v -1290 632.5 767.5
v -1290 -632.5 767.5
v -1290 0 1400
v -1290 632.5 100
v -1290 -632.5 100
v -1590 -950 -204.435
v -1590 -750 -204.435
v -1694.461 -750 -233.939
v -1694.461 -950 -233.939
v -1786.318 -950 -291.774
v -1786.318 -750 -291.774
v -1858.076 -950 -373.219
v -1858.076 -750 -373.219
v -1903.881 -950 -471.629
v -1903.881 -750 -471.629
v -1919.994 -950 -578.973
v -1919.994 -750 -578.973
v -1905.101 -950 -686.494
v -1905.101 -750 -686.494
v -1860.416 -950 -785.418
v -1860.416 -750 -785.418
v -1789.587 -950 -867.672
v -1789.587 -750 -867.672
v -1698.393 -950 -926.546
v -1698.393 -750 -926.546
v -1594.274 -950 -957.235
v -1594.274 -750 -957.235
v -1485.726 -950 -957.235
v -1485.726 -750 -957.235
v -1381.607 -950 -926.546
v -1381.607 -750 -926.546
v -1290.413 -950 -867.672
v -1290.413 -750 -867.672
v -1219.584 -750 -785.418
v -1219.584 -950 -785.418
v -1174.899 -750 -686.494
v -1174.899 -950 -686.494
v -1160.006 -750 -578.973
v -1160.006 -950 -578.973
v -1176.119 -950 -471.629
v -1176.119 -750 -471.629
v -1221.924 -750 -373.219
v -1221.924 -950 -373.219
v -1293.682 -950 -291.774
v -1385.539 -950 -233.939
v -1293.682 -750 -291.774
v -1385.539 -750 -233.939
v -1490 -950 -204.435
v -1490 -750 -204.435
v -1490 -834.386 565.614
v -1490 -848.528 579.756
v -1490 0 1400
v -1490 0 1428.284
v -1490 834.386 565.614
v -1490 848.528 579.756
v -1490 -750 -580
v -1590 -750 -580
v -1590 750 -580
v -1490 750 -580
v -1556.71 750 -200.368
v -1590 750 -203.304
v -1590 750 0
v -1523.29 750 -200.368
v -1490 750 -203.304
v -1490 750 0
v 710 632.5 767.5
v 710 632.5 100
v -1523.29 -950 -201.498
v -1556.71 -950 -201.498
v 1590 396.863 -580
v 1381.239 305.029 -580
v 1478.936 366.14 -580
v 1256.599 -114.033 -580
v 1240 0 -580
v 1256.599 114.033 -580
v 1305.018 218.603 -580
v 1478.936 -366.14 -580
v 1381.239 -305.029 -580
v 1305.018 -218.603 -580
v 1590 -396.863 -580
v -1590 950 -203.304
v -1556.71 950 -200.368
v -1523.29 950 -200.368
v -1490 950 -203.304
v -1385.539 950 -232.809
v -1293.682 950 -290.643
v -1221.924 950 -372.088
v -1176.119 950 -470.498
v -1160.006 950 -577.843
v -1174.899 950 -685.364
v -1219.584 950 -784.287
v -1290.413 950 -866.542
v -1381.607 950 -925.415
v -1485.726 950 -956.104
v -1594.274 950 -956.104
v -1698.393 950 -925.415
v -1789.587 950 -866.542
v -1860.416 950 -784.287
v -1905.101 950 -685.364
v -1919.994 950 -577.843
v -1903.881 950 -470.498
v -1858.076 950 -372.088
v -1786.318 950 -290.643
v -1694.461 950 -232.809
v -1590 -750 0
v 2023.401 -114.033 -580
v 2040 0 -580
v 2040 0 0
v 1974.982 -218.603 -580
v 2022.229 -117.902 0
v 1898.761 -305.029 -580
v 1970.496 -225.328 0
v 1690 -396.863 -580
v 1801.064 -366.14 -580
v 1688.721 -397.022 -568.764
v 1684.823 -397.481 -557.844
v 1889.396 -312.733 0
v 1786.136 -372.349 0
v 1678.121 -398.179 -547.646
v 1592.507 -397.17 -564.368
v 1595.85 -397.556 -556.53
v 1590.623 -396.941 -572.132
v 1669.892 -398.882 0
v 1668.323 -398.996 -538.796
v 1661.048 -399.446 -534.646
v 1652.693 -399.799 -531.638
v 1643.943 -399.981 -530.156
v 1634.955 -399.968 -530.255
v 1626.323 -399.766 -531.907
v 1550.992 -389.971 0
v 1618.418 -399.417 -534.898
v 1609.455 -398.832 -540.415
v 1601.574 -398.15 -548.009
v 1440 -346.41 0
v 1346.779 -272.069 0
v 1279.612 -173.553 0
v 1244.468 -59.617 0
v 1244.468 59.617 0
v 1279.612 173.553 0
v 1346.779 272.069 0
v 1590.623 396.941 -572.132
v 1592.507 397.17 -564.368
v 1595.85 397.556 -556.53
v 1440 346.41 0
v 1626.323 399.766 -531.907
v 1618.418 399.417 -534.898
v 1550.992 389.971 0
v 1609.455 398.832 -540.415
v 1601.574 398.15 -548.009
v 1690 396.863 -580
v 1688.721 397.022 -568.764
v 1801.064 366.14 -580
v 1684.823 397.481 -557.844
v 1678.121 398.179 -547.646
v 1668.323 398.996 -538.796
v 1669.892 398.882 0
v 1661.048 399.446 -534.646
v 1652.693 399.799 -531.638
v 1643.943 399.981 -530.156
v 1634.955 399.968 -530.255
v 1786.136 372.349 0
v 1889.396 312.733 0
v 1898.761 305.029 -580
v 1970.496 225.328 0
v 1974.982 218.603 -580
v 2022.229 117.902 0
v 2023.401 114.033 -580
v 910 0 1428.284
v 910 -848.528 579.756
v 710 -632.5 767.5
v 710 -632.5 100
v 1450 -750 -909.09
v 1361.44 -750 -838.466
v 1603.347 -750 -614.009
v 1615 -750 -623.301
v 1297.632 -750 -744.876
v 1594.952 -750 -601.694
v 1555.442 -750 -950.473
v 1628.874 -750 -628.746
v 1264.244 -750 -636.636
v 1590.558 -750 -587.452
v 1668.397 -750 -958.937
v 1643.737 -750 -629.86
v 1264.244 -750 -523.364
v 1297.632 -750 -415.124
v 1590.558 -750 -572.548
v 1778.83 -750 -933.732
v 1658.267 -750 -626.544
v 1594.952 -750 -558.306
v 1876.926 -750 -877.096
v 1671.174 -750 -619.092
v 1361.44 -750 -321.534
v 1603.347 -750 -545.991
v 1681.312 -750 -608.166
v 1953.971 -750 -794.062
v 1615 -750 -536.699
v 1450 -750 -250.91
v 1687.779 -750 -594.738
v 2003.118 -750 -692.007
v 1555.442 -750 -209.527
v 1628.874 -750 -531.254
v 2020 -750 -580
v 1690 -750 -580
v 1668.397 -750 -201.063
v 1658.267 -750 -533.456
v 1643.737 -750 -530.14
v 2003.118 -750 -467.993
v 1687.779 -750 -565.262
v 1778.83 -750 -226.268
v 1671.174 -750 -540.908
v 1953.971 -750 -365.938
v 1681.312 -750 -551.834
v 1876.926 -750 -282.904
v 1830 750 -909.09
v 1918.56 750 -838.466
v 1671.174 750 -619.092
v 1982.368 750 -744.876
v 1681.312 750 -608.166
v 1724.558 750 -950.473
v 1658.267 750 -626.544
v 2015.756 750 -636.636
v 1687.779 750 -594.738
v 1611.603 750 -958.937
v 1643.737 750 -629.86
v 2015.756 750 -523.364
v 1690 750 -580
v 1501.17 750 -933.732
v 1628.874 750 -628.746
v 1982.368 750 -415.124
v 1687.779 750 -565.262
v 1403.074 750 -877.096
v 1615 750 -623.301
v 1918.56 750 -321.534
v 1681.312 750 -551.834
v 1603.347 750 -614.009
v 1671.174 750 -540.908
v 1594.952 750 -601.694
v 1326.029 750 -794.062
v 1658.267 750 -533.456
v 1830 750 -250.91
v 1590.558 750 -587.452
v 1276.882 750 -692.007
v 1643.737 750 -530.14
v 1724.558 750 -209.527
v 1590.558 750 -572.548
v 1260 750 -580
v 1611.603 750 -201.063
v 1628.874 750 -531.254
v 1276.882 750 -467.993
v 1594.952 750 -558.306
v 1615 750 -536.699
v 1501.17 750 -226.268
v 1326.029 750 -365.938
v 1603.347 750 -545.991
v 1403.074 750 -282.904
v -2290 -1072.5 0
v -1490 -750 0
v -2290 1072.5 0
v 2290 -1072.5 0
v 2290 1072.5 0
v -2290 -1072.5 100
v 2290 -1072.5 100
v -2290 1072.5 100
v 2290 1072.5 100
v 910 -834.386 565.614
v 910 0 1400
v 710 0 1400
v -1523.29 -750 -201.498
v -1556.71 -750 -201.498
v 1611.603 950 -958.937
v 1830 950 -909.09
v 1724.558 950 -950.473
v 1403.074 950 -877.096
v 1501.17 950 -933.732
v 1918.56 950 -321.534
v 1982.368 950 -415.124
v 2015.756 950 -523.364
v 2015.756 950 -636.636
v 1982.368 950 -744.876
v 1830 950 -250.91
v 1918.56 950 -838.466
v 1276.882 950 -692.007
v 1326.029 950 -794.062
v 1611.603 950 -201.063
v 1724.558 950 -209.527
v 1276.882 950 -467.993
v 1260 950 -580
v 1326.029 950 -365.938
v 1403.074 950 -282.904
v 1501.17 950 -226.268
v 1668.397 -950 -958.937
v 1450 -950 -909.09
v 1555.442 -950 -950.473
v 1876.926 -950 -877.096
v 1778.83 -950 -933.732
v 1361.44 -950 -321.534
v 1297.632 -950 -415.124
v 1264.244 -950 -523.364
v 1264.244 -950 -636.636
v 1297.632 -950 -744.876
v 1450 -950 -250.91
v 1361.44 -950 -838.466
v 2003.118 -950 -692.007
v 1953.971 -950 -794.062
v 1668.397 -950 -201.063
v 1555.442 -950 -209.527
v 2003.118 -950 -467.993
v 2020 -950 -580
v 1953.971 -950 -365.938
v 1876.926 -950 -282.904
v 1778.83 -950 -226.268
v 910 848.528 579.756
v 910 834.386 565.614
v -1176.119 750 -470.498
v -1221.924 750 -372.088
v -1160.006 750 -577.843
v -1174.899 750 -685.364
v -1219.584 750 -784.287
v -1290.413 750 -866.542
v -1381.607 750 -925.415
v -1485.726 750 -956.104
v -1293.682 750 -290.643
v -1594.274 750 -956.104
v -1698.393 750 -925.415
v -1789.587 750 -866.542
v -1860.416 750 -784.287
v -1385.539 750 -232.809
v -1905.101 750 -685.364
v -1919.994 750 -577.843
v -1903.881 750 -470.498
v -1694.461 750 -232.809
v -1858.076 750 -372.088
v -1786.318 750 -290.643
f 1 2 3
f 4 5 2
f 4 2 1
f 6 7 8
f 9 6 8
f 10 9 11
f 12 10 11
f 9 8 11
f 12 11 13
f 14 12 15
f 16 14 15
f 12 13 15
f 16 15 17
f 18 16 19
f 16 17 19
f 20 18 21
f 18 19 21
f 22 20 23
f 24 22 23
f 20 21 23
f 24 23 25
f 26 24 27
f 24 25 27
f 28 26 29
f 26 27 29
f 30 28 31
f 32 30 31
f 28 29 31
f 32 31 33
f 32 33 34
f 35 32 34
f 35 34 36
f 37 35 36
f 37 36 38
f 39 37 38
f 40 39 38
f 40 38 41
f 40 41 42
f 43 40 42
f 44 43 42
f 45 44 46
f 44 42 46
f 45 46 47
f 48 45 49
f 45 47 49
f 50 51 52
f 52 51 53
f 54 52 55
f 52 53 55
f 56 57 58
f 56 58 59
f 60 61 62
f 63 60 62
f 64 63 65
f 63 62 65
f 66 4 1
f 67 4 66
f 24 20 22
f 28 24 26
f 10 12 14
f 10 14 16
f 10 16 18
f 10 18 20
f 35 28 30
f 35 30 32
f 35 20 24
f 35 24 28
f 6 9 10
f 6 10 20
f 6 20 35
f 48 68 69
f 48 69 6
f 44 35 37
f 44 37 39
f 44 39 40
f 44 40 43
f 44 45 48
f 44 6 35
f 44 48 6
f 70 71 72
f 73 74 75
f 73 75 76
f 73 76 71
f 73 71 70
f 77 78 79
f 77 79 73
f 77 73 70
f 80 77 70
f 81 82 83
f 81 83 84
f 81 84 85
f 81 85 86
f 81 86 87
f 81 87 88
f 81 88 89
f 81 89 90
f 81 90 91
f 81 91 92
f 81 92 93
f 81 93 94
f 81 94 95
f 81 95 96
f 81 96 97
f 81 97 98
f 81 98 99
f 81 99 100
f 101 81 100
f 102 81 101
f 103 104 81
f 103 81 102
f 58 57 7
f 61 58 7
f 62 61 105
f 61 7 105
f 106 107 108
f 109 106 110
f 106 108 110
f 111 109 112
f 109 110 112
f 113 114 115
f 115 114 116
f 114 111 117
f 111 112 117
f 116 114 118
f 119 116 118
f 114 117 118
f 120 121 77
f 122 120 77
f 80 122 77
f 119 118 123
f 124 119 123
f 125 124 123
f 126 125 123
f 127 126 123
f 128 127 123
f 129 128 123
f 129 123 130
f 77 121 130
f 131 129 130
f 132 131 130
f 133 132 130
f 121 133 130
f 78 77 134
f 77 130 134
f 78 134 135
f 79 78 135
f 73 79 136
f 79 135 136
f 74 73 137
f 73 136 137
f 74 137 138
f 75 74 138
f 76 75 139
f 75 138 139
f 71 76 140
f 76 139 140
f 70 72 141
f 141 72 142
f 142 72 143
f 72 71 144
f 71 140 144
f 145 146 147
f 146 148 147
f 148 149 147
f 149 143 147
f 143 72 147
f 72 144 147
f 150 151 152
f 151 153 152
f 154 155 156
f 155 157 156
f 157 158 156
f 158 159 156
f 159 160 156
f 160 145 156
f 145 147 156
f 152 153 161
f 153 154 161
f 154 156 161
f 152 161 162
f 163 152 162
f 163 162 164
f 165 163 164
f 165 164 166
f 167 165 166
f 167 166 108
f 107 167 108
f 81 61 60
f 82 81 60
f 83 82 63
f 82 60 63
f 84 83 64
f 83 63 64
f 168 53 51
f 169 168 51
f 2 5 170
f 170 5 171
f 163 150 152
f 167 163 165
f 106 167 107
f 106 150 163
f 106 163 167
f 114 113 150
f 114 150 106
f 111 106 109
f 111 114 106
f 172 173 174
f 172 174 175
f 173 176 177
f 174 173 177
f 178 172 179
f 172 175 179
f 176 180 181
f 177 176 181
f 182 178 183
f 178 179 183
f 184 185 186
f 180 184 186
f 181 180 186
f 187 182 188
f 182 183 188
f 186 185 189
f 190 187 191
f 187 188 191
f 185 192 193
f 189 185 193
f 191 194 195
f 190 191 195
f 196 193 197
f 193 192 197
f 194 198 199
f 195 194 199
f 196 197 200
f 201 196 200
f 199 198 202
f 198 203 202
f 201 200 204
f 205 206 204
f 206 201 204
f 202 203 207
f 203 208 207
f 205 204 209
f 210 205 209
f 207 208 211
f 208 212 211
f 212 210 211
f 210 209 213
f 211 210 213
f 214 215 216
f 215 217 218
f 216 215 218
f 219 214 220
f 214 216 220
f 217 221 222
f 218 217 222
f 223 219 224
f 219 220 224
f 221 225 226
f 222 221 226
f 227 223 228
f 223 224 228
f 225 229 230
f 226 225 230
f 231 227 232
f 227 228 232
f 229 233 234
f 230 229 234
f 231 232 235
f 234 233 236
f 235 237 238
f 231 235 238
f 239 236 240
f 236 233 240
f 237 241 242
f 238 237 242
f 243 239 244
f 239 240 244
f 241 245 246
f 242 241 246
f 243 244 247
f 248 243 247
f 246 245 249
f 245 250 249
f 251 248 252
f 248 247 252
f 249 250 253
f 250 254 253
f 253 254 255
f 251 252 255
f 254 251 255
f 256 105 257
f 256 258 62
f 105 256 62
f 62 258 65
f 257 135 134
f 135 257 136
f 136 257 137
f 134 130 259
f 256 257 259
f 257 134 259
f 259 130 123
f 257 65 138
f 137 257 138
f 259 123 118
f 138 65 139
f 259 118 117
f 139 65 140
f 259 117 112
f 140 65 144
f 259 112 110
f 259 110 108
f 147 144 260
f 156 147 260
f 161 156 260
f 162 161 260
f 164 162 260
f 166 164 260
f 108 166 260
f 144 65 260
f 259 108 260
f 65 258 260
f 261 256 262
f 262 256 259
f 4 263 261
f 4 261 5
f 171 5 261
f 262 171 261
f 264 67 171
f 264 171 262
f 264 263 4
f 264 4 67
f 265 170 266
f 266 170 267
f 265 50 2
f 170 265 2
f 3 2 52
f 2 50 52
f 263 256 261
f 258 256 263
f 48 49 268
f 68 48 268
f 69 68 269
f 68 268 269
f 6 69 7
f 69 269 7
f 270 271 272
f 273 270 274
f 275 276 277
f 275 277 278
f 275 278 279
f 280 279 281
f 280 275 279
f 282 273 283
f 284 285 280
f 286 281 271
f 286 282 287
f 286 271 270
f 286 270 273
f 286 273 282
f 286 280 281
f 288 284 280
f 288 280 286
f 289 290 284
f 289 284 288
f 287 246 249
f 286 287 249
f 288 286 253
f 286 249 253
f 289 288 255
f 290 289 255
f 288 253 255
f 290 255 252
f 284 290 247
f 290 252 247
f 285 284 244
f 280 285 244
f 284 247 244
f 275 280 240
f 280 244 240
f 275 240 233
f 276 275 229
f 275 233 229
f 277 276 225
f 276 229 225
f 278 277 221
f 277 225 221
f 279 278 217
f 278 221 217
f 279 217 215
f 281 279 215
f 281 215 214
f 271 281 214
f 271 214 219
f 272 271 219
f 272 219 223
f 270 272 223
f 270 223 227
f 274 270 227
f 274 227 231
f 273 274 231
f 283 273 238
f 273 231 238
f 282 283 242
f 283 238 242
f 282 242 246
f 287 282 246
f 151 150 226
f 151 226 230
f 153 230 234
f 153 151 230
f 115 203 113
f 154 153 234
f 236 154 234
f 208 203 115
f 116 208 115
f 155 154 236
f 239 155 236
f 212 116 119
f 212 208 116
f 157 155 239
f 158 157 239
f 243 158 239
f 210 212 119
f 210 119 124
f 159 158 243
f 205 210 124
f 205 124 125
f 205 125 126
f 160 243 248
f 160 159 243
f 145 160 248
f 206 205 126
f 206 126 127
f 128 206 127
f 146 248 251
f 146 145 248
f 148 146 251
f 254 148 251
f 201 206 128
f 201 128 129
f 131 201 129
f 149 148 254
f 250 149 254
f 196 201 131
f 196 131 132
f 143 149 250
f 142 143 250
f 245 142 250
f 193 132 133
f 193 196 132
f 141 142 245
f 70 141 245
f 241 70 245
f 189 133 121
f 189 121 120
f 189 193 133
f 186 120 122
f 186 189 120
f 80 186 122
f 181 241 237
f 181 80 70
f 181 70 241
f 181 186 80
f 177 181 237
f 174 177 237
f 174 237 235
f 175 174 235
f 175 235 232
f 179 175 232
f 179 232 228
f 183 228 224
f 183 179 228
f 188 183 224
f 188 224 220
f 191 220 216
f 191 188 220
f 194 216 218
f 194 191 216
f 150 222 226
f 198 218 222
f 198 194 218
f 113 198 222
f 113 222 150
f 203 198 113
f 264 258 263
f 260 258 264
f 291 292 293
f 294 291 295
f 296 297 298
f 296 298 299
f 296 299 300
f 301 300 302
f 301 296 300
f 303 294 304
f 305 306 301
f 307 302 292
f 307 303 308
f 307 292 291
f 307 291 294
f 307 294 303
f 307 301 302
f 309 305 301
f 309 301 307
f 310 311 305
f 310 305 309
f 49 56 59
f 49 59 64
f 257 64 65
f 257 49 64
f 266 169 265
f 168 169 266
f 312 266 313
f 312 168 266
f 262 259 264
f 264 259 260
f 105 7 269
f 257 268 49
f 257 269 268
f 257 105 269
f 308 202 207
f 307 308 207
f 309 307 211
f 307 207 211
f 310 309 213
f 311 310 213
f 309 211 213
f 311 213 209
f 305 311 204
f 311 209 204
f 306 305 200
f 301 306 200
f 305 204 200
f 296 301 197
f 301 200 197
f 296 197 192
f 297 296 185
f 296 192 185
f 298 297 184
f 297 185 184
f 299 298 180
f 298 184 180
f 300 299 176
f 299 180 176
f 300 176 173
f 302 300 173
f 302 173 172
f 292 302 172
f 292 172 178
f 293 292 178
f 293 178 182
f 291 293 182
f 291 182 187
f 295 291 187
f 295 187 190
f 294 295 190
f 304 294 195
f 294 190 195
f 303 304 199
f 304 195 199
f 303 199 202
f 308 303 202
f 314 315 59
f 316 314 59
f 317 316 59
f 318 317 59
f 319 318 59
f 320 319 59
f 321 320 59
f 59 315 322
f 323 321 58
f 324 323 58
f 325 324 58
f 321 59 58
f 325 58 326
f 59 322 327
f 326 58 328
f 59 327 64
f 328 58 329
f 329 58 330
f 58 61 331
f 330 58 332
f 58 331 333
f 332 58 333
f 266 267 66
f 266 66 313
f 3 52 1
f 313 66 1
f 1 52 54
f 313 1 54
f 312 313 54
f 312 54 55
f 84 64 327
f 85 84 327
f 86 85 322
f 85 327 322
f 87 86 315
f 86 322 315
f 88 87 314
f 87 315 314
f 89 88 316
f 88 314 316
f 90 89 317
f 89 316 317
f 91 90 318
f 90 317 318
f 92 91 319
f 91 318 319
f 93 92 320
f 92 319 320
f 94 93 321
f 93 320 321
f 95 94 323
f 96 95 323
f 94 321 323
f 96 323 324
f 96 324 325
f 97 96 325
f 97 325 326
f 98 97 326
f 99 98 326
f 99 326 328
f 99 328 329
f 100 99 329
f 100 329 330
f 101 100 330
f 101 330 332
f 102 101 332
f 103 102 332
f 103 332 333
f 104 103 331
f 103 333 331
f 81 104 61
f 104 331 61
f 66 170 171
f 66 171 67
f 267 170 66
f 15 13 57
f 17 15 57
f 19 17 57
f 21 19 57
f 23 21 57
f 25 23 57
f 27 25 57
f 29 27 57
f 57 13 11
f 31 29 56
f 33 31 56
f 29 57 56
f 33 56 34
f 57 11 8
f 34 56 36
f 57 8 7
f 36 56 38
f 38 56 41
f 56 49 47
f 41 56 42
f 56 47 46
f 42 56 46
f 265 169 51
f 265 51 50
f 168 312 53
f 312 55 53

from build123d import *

# Parameters (mm, degrees)
F0_W      = 4580
F0_H      = 2145
F1_DEPTH  = 100
F2_W      = 100
F2_H      = 580
F3_DEPTH  = 450
F4_DEPTH  = 750
F6_DEPTH  = 200
F8_DEPTH  = 200
F9_R      = 400
F10_DEPTH = 580
F11_R     = 50
F12_DEPTH = 750
F13_R     = 380
F13_R_2   = 50
F14_DEPTH = 200
F15_R     = 380
F15_R_2   = 50
F16_DEPTH = 200
F17_W     = 2000
F17_H     = 1265
F18_DEPTH = 2000
F20_DEPTH = 2000
F22_DEPTH = 2200
F23_DEPTH = 200


# Not quite as in the source:
# - a feature names something its author has since deleted; it is built from what else it names


with BuildPart() as f1:
    # F0 (on Top) → F1 (new body)
    with BuildSketch(Plane.XY):
        Rectangle(F0_W, F0_H)
    extrude(amount=F1_DEPTH)

    # F2 (on Front) → F3 (join, symmetric)
    with BuildSketch(Plane.XZ):
        with Locations((-1540, -290)):
            Rectangle(F2_W, F2_H)
    extrude(amount=F3_DEPTH, both=True)

    # F2 (on Front) → F4 (join, symmetric)
    with BuildSketch(Plane.XZ):
        with Locations((-1540, -290)):
            Rectangle(F2_W, F2_H)
    extrude(amount=F4_DEPTH, both=True)

    # F5 (on face) → F6 (join)
    with BuildSketch(Plane.XZ.offset(750)):
        with BuildLine():
            ThreePointArc((-1590, -204.43457899), (-1790.399680511, -866.9628615859), (-1160, -581.1307430267))
            ThreePointArc((-1160, -581.1307430267), (-1254.1678814409, -330.7310625158), (-1490, -204.43457899))
            Line((-1490, -204.43457899), (-1490, -580))
            Line((-1490, -580), (-1590, -580))
            Line((-1590, -580), (-1590, -204.43457899))
        make_face()
        with BuildLine():
            Line((-1490, -580), (-1490, -204.43457899))
            ThreePointArc((-1490, -204.43457899), (-1540, -201.1307430267), (-1590, -204.43457899))
            Line((-1590, -204.43457899), (-1590, -580))
            Line((-1590, -580), (-1490, -580))
        make_face()
    extrude(amount=F6_DEPTH)

    # F7 (on face) → F8 (join)
    with BuildSketch(Plane(origin=(0, 750, 0), x_dir=(-1, 0, 0), z_dir=(0, 1, 0))):
        with BuildLine():
            Line((1590, -580), (1590, -203.3038359633))
            ThreePointArc((1590, -203.3038359633), (1540, -200), (1490, -203.3038359633))
            Line((1490, -203.3038359633), (1490, -580))
            Line((1490, -580), (1590, -580))
        make_face()
        with BuildLine():
            ThreePointArc((1490, -203.3038359633), (1289.600319489, -865.8321185591), (1920, -580))
            ThreePointArc((1920, -580), (1825.8321185591, -329.600319489), (1590, -203.3038359633))
            Line((1590, -203.3038359633), (1590, -580))
            Line((1590, -580), (1490, -580))
            Line((1490, -580), (1490, -203.3038359633))
        make_face()
    extrude(amount=F8_DEPTH)

    # F9 (on face) → F10 (join)
    with BuildSketch(Plane(origin=(0, 0, 0), x_dir=(1, 0, 0), z_dir=(0, 0, -1))):
        with Locations((1640, 0)):
            Circle(F9_R)
    extrude(amount=F10_DEPTH)

    # F11 (on Front) → F12 (join, symmetric)
    with BuildSketch(Plane.XZ):
        with Locations((1640, -580)):
            Circle(F11_R)
    extrude(amount=F12_DEPTH, both=True)

    # F13 (on face) → F14 (join)
    with BuildSketch(Plane.XZ.offset(750)):
        with Locations((1640, -580)):
            Circle(F13_R)
        with Locations((1640, -580)):
            Circle(F13_R_2, mode=Mode.SUBTRACT)
        with Locations((1640, -580)):
            Circle(F13_R_2)
    extrude(amount=F14_DEPTH)

    # F15 (on face) → F16 (join)
    with BuildSketch(Plane(origin=(0, 750, 0), x_dir=(-1, 0, 0), z_dir=(0, 1, 0))):
        with Locations((-1640, -580)):
            Circle(F15_R)
        with Locations((-1640, -580)):
            Circle(F15_R_2, mode=Mode.SUBTRACT)
        with Locations((-1640, -580)):
            Circle(F15_R_2)
    extrude(amount=F16_DEPTH)

    # F17 (on face) → F18 (join)
    with BuildSketch(Plane.XY.offset(100)):
        with Locations((-290, 0)):
            Rectangle(F17_W, F17_H)
    extrude(amount=F18_DEPTH)

    # F19 (on face) → F20 (cut)
    with BuildSketch(Plane.YZ.offset(710)):
        Polygon((-824.2233241082, 575.7766758918), (-632.5, 767.5), (-632.5, 2100), (632.5, 2100), (632.5, 767.5), (998.3408662269, 401.6591337731), (998.3408662269, 2239.1670500755), (-824.2233241082, 2239.1670500755), align=None)
        Polygon((-632.5, 767.5), (0, 1400), (632.5, 767.5), (632.5, 2100), (-632.5, 2100), align=None)
    extrude(amount=-F20_DEPTH, mode=Mode.SUBTRACT)

    # F21 (on face) → F22 (join)
    with BuildSketch(Plane.YZ.offset(710)):
        Polygon((-632.5, 767.5), (0, 1400), (632.5, 767.5), (834.3860018001, 565.6139981999), (848.5281374239, 579.7561338236), (0, 1428.2842712475), (-848.5281374239, 579.7561338236), (-834.3860018001, 565.6139981999), align=None)
    extrude(amount=-F22_DEPTH)

    # F21 (on face) → F23 (join)
    with BuildSketch(Plane.YZ.offset(710)):
        Polygon((-834.3860018001, 565.6139981999), (0, 1400), (834.3860018001, 565.6139981999), (848.5281374239, 579.7561338236), (0, 1428.2842712475), (-848.5281374239, 579.7561338236), align=None)
    extrude(amount=F23_DEPTH)


solid = f1.part
